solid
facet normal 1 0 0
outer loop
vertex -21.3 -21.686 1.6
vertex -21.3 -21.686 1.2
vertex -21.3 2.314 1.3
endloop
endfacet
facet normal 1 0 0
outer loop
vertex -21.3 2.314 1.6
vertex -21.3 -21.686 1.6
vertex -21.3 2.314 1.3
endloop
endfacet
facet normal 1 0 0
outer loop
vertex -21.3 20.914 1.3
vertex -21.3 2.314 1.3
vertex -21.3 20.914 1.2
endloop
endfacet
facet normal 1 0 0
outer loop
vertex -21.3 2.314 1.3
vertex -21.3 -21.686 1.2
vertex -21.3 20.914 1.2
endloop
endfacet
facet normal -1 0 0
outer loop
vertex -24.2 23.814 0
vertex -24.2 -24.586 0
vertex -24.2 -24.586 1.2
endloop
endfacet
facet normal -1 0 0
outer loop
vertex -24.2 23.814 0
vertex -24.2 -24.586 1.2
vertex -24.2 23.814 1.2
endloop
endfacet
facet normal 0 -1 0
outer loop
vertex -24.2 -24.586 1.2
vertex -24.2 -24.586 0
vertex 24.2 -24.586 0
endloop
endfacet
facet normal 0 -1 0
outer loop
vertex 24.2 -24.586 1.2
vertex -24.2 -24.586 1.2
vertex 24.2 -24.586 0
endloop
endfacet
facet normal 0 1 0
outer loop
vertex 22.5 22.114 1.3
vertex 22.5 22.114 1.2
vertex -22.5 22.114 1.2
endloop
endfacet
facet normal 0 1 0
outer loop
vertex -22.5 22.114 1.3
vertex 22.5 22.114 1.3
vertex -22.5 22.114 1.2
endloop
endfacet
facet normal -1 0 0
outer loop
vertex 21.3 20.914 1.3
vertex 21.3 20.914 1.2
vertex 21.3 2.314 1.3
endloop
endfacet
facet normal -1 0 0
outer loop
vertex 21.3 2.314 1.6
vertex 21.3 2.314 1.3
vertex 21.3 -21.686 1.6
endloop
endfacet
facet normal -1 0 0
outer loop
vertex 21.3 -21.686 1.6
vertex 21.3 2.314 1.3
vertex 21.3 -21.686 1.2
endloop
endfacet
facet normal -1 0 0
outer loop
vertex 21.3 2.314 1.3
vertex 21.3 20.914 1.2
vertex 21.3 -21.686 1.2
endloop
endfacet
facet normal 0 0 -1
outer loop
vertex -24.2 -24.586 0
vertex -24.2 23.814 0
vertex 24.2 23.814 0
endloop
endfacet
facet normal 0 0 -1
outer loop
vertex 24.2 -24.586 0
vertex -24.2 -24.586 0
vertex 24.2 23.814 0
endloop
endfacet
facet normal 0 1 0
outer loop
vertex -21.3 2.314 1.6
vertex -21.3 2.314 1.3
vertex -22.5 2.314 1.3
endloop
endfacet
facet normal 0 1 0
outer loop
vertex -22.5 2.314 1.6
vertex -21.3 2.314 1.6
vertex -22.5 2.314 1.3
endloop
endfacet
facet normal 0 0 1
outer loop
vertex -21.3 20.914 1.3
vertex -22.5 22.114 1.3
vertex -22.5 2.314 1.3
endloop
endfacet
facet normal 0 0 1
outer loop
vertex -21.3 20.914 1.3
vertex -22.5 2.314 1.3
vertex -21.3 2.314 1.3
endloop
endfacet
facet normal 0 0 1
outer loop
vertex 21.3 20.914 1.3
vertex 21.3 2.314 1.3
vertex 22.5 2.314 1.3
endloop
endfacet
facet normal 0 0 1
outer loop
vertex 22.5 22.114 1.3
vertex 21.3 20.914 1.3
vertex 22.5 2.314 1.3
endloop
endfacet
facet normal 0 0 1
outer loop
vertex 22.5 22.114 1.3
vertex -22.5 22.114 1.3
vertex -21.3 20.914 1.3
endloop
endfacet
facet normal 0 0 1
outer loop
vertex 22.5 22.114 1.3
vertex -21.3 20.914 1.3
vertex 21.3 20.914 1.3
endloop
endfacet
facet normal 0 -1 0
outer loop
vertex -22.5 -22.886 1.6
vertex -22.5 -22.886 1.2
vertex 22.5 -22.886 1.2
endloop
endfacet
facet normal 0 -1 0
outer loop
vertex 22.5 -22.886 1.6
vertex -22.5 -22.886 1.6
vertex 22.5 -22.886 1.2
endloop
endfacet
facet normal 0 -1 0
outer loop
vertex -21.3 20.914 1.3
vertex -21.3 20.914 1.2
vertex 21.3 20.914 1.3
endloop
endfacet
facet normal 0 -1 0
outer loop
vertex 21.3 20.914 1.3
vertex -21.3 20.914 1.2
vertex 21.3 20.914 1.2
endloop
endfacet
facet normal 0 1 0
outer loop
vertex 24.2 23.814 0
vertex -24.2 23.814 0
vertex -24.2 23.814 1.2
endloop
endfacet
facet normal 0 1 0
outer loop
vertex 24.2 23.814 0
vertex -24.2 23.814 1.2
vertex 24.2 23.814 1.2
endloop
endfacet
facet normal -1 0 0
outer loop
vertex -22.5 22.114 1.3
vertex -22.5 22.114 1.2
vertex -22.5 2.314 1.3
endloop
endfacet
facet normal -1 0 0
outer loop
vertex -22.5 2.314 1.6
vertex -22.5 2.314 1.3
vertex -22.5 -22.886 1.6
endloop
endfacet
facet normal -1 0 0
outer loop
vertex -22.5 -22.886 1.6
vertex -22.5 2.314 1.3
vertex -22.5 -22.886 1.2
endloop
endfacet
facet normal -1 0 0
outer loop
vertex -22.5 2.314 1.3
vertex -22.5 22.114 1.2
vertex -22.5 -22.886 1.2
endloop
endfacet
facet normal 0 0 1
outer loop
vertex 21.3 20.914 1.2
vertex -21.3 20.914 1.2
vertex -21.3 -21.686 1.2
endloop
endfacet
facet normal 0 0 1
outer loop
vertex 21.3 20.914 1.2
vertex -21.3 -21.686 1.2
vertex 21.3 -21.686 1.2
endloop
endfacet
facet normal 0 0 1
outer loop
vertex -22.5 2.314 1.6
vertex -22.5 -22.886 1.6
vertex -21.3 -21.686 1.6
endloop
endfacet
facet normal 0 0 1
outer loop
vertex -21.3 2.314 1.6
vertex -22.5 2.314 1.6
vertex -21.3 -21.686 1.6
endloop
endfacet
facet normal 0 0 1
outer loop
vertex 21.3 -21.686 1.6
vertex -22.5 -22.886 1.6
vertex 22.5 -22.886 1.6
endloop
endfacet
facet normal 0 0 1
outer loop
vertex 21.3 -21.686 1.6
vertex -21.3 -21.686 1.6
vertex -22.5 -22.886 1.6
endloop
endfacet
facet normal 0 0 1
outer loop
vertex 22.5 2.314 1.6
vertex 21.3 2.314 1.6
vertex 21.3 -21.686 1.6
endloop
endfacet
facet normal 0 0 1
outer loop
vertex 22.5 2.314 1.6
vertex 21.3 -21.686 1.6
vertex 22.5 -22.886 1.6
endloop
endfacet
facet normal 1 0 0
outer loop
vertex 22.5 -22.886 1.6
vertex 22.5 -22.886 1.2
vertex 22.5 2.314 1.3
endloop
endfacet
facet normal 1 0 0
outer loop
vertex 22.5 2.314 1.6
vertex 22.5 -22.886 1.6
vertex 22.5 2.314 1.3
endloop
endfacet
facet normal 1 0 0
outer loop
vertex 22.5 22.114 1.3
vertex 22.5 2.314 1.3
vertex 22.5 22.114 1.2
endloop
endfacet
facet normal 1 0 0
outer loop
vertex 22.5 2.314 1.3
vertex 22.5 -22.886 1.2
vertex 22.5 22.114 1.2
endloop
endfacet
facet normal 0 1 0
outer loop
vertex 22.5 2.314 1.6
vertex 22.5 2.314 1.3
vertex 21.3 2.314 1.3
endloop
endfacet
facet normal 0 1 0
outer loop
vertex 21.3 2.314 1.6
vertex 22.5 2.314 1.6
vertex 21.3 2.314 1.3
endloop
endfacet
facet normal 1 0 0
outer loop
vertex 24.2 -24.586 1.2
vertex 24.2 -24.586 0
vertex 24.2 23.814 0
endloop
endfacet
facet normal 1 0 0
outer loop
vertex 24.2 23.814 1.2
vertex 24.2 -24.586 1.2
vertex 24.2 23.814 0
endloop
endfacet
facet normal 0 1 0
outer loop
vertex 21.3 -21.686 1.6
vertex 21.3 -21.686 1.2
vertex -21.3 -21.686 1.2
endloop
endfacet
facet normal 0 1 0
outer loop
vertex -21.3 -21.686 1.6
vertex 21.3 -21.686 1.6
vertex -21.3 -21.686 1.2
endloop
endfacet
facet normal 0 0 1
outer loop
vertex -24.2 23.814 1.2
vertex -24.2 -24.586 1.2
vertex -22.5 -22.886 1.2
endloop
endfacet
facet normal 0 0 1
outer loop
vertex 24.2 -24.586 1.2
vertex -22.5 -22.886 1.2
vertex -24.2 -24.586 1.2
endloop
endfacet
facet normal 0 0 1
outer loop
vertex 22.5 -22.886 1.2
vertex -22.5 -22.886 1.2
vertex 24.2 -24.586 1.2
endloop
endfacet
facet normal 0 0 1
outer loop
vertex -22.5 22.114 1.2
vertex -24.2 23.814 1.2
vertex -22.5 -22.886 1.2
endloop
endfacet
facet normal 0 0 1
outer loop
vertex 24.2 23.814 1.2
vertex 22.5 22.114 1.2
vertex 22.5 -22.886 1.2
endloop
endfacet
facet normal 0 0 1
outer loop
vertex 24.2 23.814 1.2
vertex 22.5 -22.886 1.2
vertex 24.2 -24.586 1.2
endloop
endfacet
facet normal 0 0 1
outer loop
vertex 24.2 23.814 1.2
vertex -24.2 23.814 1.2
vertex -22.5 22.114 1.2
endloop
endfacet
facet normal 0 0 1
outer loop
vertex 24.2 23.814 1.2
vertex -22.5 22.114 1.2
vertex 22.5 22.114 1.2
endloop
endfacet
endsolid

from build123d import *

# Parameters (mm, degrees)
F3_DEPTH = 1.6
F4_DEPTH = 1.3
F2_W     = 48.4
F2_H     = 48.4
F5_DEPTH = 1.2


with BuildPart() as f3:
    # F0 (on Top) → F3 (new body)
    with BuildSketch(Plane.XY):
        Polygon((-21.3, 2.314286), (-22.5, 2.314286), (-22.5, -22.885714), (22.5, -22.885714), (22.5, 2.314286), (21.3, 2.314286), (21.3, -21.685714), (-21.3, -21.685714), align=None)
    extrude(amount=F3_DEPTH)

    # F1 (on Top) → F4 (join)
    with BuildSketch(Plane.XY):
        Polygon((22.5, 22.114286), (-22.5, 22.114286), (-22.5, 2.314286), (-21.3, 2.314286), (-21.3, 20.914286), (21.3, 20.914286), (21.3, 2.314286), (22.5, 2.314286), align=None)
    extrude(amount=F4_DEPTH)

    # F2 (on Top) → F5 (join)
    with BuildSketch(Plane.XY):
        with Locations((0, -0.385714)):
            Rectangle(F2_W, F2_H)
        Polygon((-22.5, 2.314286), (-22.5, 22.114286), (22.5, 22.114286), (22.5, 2.314286), (22.5, -22.885714), (-22.5, -22.885714), align=None, mode=Mode.SUBTRACT)
        Polygon((-21.3, 20.914286), (-21.3, 2.314286), (-21.3, -21.685714), (21.3, -21.685714), (21.3, 2.314286), (21.3, 20.914286), align=None)
    extrude(amount=F5_DEPTH)


solid = f3.part
